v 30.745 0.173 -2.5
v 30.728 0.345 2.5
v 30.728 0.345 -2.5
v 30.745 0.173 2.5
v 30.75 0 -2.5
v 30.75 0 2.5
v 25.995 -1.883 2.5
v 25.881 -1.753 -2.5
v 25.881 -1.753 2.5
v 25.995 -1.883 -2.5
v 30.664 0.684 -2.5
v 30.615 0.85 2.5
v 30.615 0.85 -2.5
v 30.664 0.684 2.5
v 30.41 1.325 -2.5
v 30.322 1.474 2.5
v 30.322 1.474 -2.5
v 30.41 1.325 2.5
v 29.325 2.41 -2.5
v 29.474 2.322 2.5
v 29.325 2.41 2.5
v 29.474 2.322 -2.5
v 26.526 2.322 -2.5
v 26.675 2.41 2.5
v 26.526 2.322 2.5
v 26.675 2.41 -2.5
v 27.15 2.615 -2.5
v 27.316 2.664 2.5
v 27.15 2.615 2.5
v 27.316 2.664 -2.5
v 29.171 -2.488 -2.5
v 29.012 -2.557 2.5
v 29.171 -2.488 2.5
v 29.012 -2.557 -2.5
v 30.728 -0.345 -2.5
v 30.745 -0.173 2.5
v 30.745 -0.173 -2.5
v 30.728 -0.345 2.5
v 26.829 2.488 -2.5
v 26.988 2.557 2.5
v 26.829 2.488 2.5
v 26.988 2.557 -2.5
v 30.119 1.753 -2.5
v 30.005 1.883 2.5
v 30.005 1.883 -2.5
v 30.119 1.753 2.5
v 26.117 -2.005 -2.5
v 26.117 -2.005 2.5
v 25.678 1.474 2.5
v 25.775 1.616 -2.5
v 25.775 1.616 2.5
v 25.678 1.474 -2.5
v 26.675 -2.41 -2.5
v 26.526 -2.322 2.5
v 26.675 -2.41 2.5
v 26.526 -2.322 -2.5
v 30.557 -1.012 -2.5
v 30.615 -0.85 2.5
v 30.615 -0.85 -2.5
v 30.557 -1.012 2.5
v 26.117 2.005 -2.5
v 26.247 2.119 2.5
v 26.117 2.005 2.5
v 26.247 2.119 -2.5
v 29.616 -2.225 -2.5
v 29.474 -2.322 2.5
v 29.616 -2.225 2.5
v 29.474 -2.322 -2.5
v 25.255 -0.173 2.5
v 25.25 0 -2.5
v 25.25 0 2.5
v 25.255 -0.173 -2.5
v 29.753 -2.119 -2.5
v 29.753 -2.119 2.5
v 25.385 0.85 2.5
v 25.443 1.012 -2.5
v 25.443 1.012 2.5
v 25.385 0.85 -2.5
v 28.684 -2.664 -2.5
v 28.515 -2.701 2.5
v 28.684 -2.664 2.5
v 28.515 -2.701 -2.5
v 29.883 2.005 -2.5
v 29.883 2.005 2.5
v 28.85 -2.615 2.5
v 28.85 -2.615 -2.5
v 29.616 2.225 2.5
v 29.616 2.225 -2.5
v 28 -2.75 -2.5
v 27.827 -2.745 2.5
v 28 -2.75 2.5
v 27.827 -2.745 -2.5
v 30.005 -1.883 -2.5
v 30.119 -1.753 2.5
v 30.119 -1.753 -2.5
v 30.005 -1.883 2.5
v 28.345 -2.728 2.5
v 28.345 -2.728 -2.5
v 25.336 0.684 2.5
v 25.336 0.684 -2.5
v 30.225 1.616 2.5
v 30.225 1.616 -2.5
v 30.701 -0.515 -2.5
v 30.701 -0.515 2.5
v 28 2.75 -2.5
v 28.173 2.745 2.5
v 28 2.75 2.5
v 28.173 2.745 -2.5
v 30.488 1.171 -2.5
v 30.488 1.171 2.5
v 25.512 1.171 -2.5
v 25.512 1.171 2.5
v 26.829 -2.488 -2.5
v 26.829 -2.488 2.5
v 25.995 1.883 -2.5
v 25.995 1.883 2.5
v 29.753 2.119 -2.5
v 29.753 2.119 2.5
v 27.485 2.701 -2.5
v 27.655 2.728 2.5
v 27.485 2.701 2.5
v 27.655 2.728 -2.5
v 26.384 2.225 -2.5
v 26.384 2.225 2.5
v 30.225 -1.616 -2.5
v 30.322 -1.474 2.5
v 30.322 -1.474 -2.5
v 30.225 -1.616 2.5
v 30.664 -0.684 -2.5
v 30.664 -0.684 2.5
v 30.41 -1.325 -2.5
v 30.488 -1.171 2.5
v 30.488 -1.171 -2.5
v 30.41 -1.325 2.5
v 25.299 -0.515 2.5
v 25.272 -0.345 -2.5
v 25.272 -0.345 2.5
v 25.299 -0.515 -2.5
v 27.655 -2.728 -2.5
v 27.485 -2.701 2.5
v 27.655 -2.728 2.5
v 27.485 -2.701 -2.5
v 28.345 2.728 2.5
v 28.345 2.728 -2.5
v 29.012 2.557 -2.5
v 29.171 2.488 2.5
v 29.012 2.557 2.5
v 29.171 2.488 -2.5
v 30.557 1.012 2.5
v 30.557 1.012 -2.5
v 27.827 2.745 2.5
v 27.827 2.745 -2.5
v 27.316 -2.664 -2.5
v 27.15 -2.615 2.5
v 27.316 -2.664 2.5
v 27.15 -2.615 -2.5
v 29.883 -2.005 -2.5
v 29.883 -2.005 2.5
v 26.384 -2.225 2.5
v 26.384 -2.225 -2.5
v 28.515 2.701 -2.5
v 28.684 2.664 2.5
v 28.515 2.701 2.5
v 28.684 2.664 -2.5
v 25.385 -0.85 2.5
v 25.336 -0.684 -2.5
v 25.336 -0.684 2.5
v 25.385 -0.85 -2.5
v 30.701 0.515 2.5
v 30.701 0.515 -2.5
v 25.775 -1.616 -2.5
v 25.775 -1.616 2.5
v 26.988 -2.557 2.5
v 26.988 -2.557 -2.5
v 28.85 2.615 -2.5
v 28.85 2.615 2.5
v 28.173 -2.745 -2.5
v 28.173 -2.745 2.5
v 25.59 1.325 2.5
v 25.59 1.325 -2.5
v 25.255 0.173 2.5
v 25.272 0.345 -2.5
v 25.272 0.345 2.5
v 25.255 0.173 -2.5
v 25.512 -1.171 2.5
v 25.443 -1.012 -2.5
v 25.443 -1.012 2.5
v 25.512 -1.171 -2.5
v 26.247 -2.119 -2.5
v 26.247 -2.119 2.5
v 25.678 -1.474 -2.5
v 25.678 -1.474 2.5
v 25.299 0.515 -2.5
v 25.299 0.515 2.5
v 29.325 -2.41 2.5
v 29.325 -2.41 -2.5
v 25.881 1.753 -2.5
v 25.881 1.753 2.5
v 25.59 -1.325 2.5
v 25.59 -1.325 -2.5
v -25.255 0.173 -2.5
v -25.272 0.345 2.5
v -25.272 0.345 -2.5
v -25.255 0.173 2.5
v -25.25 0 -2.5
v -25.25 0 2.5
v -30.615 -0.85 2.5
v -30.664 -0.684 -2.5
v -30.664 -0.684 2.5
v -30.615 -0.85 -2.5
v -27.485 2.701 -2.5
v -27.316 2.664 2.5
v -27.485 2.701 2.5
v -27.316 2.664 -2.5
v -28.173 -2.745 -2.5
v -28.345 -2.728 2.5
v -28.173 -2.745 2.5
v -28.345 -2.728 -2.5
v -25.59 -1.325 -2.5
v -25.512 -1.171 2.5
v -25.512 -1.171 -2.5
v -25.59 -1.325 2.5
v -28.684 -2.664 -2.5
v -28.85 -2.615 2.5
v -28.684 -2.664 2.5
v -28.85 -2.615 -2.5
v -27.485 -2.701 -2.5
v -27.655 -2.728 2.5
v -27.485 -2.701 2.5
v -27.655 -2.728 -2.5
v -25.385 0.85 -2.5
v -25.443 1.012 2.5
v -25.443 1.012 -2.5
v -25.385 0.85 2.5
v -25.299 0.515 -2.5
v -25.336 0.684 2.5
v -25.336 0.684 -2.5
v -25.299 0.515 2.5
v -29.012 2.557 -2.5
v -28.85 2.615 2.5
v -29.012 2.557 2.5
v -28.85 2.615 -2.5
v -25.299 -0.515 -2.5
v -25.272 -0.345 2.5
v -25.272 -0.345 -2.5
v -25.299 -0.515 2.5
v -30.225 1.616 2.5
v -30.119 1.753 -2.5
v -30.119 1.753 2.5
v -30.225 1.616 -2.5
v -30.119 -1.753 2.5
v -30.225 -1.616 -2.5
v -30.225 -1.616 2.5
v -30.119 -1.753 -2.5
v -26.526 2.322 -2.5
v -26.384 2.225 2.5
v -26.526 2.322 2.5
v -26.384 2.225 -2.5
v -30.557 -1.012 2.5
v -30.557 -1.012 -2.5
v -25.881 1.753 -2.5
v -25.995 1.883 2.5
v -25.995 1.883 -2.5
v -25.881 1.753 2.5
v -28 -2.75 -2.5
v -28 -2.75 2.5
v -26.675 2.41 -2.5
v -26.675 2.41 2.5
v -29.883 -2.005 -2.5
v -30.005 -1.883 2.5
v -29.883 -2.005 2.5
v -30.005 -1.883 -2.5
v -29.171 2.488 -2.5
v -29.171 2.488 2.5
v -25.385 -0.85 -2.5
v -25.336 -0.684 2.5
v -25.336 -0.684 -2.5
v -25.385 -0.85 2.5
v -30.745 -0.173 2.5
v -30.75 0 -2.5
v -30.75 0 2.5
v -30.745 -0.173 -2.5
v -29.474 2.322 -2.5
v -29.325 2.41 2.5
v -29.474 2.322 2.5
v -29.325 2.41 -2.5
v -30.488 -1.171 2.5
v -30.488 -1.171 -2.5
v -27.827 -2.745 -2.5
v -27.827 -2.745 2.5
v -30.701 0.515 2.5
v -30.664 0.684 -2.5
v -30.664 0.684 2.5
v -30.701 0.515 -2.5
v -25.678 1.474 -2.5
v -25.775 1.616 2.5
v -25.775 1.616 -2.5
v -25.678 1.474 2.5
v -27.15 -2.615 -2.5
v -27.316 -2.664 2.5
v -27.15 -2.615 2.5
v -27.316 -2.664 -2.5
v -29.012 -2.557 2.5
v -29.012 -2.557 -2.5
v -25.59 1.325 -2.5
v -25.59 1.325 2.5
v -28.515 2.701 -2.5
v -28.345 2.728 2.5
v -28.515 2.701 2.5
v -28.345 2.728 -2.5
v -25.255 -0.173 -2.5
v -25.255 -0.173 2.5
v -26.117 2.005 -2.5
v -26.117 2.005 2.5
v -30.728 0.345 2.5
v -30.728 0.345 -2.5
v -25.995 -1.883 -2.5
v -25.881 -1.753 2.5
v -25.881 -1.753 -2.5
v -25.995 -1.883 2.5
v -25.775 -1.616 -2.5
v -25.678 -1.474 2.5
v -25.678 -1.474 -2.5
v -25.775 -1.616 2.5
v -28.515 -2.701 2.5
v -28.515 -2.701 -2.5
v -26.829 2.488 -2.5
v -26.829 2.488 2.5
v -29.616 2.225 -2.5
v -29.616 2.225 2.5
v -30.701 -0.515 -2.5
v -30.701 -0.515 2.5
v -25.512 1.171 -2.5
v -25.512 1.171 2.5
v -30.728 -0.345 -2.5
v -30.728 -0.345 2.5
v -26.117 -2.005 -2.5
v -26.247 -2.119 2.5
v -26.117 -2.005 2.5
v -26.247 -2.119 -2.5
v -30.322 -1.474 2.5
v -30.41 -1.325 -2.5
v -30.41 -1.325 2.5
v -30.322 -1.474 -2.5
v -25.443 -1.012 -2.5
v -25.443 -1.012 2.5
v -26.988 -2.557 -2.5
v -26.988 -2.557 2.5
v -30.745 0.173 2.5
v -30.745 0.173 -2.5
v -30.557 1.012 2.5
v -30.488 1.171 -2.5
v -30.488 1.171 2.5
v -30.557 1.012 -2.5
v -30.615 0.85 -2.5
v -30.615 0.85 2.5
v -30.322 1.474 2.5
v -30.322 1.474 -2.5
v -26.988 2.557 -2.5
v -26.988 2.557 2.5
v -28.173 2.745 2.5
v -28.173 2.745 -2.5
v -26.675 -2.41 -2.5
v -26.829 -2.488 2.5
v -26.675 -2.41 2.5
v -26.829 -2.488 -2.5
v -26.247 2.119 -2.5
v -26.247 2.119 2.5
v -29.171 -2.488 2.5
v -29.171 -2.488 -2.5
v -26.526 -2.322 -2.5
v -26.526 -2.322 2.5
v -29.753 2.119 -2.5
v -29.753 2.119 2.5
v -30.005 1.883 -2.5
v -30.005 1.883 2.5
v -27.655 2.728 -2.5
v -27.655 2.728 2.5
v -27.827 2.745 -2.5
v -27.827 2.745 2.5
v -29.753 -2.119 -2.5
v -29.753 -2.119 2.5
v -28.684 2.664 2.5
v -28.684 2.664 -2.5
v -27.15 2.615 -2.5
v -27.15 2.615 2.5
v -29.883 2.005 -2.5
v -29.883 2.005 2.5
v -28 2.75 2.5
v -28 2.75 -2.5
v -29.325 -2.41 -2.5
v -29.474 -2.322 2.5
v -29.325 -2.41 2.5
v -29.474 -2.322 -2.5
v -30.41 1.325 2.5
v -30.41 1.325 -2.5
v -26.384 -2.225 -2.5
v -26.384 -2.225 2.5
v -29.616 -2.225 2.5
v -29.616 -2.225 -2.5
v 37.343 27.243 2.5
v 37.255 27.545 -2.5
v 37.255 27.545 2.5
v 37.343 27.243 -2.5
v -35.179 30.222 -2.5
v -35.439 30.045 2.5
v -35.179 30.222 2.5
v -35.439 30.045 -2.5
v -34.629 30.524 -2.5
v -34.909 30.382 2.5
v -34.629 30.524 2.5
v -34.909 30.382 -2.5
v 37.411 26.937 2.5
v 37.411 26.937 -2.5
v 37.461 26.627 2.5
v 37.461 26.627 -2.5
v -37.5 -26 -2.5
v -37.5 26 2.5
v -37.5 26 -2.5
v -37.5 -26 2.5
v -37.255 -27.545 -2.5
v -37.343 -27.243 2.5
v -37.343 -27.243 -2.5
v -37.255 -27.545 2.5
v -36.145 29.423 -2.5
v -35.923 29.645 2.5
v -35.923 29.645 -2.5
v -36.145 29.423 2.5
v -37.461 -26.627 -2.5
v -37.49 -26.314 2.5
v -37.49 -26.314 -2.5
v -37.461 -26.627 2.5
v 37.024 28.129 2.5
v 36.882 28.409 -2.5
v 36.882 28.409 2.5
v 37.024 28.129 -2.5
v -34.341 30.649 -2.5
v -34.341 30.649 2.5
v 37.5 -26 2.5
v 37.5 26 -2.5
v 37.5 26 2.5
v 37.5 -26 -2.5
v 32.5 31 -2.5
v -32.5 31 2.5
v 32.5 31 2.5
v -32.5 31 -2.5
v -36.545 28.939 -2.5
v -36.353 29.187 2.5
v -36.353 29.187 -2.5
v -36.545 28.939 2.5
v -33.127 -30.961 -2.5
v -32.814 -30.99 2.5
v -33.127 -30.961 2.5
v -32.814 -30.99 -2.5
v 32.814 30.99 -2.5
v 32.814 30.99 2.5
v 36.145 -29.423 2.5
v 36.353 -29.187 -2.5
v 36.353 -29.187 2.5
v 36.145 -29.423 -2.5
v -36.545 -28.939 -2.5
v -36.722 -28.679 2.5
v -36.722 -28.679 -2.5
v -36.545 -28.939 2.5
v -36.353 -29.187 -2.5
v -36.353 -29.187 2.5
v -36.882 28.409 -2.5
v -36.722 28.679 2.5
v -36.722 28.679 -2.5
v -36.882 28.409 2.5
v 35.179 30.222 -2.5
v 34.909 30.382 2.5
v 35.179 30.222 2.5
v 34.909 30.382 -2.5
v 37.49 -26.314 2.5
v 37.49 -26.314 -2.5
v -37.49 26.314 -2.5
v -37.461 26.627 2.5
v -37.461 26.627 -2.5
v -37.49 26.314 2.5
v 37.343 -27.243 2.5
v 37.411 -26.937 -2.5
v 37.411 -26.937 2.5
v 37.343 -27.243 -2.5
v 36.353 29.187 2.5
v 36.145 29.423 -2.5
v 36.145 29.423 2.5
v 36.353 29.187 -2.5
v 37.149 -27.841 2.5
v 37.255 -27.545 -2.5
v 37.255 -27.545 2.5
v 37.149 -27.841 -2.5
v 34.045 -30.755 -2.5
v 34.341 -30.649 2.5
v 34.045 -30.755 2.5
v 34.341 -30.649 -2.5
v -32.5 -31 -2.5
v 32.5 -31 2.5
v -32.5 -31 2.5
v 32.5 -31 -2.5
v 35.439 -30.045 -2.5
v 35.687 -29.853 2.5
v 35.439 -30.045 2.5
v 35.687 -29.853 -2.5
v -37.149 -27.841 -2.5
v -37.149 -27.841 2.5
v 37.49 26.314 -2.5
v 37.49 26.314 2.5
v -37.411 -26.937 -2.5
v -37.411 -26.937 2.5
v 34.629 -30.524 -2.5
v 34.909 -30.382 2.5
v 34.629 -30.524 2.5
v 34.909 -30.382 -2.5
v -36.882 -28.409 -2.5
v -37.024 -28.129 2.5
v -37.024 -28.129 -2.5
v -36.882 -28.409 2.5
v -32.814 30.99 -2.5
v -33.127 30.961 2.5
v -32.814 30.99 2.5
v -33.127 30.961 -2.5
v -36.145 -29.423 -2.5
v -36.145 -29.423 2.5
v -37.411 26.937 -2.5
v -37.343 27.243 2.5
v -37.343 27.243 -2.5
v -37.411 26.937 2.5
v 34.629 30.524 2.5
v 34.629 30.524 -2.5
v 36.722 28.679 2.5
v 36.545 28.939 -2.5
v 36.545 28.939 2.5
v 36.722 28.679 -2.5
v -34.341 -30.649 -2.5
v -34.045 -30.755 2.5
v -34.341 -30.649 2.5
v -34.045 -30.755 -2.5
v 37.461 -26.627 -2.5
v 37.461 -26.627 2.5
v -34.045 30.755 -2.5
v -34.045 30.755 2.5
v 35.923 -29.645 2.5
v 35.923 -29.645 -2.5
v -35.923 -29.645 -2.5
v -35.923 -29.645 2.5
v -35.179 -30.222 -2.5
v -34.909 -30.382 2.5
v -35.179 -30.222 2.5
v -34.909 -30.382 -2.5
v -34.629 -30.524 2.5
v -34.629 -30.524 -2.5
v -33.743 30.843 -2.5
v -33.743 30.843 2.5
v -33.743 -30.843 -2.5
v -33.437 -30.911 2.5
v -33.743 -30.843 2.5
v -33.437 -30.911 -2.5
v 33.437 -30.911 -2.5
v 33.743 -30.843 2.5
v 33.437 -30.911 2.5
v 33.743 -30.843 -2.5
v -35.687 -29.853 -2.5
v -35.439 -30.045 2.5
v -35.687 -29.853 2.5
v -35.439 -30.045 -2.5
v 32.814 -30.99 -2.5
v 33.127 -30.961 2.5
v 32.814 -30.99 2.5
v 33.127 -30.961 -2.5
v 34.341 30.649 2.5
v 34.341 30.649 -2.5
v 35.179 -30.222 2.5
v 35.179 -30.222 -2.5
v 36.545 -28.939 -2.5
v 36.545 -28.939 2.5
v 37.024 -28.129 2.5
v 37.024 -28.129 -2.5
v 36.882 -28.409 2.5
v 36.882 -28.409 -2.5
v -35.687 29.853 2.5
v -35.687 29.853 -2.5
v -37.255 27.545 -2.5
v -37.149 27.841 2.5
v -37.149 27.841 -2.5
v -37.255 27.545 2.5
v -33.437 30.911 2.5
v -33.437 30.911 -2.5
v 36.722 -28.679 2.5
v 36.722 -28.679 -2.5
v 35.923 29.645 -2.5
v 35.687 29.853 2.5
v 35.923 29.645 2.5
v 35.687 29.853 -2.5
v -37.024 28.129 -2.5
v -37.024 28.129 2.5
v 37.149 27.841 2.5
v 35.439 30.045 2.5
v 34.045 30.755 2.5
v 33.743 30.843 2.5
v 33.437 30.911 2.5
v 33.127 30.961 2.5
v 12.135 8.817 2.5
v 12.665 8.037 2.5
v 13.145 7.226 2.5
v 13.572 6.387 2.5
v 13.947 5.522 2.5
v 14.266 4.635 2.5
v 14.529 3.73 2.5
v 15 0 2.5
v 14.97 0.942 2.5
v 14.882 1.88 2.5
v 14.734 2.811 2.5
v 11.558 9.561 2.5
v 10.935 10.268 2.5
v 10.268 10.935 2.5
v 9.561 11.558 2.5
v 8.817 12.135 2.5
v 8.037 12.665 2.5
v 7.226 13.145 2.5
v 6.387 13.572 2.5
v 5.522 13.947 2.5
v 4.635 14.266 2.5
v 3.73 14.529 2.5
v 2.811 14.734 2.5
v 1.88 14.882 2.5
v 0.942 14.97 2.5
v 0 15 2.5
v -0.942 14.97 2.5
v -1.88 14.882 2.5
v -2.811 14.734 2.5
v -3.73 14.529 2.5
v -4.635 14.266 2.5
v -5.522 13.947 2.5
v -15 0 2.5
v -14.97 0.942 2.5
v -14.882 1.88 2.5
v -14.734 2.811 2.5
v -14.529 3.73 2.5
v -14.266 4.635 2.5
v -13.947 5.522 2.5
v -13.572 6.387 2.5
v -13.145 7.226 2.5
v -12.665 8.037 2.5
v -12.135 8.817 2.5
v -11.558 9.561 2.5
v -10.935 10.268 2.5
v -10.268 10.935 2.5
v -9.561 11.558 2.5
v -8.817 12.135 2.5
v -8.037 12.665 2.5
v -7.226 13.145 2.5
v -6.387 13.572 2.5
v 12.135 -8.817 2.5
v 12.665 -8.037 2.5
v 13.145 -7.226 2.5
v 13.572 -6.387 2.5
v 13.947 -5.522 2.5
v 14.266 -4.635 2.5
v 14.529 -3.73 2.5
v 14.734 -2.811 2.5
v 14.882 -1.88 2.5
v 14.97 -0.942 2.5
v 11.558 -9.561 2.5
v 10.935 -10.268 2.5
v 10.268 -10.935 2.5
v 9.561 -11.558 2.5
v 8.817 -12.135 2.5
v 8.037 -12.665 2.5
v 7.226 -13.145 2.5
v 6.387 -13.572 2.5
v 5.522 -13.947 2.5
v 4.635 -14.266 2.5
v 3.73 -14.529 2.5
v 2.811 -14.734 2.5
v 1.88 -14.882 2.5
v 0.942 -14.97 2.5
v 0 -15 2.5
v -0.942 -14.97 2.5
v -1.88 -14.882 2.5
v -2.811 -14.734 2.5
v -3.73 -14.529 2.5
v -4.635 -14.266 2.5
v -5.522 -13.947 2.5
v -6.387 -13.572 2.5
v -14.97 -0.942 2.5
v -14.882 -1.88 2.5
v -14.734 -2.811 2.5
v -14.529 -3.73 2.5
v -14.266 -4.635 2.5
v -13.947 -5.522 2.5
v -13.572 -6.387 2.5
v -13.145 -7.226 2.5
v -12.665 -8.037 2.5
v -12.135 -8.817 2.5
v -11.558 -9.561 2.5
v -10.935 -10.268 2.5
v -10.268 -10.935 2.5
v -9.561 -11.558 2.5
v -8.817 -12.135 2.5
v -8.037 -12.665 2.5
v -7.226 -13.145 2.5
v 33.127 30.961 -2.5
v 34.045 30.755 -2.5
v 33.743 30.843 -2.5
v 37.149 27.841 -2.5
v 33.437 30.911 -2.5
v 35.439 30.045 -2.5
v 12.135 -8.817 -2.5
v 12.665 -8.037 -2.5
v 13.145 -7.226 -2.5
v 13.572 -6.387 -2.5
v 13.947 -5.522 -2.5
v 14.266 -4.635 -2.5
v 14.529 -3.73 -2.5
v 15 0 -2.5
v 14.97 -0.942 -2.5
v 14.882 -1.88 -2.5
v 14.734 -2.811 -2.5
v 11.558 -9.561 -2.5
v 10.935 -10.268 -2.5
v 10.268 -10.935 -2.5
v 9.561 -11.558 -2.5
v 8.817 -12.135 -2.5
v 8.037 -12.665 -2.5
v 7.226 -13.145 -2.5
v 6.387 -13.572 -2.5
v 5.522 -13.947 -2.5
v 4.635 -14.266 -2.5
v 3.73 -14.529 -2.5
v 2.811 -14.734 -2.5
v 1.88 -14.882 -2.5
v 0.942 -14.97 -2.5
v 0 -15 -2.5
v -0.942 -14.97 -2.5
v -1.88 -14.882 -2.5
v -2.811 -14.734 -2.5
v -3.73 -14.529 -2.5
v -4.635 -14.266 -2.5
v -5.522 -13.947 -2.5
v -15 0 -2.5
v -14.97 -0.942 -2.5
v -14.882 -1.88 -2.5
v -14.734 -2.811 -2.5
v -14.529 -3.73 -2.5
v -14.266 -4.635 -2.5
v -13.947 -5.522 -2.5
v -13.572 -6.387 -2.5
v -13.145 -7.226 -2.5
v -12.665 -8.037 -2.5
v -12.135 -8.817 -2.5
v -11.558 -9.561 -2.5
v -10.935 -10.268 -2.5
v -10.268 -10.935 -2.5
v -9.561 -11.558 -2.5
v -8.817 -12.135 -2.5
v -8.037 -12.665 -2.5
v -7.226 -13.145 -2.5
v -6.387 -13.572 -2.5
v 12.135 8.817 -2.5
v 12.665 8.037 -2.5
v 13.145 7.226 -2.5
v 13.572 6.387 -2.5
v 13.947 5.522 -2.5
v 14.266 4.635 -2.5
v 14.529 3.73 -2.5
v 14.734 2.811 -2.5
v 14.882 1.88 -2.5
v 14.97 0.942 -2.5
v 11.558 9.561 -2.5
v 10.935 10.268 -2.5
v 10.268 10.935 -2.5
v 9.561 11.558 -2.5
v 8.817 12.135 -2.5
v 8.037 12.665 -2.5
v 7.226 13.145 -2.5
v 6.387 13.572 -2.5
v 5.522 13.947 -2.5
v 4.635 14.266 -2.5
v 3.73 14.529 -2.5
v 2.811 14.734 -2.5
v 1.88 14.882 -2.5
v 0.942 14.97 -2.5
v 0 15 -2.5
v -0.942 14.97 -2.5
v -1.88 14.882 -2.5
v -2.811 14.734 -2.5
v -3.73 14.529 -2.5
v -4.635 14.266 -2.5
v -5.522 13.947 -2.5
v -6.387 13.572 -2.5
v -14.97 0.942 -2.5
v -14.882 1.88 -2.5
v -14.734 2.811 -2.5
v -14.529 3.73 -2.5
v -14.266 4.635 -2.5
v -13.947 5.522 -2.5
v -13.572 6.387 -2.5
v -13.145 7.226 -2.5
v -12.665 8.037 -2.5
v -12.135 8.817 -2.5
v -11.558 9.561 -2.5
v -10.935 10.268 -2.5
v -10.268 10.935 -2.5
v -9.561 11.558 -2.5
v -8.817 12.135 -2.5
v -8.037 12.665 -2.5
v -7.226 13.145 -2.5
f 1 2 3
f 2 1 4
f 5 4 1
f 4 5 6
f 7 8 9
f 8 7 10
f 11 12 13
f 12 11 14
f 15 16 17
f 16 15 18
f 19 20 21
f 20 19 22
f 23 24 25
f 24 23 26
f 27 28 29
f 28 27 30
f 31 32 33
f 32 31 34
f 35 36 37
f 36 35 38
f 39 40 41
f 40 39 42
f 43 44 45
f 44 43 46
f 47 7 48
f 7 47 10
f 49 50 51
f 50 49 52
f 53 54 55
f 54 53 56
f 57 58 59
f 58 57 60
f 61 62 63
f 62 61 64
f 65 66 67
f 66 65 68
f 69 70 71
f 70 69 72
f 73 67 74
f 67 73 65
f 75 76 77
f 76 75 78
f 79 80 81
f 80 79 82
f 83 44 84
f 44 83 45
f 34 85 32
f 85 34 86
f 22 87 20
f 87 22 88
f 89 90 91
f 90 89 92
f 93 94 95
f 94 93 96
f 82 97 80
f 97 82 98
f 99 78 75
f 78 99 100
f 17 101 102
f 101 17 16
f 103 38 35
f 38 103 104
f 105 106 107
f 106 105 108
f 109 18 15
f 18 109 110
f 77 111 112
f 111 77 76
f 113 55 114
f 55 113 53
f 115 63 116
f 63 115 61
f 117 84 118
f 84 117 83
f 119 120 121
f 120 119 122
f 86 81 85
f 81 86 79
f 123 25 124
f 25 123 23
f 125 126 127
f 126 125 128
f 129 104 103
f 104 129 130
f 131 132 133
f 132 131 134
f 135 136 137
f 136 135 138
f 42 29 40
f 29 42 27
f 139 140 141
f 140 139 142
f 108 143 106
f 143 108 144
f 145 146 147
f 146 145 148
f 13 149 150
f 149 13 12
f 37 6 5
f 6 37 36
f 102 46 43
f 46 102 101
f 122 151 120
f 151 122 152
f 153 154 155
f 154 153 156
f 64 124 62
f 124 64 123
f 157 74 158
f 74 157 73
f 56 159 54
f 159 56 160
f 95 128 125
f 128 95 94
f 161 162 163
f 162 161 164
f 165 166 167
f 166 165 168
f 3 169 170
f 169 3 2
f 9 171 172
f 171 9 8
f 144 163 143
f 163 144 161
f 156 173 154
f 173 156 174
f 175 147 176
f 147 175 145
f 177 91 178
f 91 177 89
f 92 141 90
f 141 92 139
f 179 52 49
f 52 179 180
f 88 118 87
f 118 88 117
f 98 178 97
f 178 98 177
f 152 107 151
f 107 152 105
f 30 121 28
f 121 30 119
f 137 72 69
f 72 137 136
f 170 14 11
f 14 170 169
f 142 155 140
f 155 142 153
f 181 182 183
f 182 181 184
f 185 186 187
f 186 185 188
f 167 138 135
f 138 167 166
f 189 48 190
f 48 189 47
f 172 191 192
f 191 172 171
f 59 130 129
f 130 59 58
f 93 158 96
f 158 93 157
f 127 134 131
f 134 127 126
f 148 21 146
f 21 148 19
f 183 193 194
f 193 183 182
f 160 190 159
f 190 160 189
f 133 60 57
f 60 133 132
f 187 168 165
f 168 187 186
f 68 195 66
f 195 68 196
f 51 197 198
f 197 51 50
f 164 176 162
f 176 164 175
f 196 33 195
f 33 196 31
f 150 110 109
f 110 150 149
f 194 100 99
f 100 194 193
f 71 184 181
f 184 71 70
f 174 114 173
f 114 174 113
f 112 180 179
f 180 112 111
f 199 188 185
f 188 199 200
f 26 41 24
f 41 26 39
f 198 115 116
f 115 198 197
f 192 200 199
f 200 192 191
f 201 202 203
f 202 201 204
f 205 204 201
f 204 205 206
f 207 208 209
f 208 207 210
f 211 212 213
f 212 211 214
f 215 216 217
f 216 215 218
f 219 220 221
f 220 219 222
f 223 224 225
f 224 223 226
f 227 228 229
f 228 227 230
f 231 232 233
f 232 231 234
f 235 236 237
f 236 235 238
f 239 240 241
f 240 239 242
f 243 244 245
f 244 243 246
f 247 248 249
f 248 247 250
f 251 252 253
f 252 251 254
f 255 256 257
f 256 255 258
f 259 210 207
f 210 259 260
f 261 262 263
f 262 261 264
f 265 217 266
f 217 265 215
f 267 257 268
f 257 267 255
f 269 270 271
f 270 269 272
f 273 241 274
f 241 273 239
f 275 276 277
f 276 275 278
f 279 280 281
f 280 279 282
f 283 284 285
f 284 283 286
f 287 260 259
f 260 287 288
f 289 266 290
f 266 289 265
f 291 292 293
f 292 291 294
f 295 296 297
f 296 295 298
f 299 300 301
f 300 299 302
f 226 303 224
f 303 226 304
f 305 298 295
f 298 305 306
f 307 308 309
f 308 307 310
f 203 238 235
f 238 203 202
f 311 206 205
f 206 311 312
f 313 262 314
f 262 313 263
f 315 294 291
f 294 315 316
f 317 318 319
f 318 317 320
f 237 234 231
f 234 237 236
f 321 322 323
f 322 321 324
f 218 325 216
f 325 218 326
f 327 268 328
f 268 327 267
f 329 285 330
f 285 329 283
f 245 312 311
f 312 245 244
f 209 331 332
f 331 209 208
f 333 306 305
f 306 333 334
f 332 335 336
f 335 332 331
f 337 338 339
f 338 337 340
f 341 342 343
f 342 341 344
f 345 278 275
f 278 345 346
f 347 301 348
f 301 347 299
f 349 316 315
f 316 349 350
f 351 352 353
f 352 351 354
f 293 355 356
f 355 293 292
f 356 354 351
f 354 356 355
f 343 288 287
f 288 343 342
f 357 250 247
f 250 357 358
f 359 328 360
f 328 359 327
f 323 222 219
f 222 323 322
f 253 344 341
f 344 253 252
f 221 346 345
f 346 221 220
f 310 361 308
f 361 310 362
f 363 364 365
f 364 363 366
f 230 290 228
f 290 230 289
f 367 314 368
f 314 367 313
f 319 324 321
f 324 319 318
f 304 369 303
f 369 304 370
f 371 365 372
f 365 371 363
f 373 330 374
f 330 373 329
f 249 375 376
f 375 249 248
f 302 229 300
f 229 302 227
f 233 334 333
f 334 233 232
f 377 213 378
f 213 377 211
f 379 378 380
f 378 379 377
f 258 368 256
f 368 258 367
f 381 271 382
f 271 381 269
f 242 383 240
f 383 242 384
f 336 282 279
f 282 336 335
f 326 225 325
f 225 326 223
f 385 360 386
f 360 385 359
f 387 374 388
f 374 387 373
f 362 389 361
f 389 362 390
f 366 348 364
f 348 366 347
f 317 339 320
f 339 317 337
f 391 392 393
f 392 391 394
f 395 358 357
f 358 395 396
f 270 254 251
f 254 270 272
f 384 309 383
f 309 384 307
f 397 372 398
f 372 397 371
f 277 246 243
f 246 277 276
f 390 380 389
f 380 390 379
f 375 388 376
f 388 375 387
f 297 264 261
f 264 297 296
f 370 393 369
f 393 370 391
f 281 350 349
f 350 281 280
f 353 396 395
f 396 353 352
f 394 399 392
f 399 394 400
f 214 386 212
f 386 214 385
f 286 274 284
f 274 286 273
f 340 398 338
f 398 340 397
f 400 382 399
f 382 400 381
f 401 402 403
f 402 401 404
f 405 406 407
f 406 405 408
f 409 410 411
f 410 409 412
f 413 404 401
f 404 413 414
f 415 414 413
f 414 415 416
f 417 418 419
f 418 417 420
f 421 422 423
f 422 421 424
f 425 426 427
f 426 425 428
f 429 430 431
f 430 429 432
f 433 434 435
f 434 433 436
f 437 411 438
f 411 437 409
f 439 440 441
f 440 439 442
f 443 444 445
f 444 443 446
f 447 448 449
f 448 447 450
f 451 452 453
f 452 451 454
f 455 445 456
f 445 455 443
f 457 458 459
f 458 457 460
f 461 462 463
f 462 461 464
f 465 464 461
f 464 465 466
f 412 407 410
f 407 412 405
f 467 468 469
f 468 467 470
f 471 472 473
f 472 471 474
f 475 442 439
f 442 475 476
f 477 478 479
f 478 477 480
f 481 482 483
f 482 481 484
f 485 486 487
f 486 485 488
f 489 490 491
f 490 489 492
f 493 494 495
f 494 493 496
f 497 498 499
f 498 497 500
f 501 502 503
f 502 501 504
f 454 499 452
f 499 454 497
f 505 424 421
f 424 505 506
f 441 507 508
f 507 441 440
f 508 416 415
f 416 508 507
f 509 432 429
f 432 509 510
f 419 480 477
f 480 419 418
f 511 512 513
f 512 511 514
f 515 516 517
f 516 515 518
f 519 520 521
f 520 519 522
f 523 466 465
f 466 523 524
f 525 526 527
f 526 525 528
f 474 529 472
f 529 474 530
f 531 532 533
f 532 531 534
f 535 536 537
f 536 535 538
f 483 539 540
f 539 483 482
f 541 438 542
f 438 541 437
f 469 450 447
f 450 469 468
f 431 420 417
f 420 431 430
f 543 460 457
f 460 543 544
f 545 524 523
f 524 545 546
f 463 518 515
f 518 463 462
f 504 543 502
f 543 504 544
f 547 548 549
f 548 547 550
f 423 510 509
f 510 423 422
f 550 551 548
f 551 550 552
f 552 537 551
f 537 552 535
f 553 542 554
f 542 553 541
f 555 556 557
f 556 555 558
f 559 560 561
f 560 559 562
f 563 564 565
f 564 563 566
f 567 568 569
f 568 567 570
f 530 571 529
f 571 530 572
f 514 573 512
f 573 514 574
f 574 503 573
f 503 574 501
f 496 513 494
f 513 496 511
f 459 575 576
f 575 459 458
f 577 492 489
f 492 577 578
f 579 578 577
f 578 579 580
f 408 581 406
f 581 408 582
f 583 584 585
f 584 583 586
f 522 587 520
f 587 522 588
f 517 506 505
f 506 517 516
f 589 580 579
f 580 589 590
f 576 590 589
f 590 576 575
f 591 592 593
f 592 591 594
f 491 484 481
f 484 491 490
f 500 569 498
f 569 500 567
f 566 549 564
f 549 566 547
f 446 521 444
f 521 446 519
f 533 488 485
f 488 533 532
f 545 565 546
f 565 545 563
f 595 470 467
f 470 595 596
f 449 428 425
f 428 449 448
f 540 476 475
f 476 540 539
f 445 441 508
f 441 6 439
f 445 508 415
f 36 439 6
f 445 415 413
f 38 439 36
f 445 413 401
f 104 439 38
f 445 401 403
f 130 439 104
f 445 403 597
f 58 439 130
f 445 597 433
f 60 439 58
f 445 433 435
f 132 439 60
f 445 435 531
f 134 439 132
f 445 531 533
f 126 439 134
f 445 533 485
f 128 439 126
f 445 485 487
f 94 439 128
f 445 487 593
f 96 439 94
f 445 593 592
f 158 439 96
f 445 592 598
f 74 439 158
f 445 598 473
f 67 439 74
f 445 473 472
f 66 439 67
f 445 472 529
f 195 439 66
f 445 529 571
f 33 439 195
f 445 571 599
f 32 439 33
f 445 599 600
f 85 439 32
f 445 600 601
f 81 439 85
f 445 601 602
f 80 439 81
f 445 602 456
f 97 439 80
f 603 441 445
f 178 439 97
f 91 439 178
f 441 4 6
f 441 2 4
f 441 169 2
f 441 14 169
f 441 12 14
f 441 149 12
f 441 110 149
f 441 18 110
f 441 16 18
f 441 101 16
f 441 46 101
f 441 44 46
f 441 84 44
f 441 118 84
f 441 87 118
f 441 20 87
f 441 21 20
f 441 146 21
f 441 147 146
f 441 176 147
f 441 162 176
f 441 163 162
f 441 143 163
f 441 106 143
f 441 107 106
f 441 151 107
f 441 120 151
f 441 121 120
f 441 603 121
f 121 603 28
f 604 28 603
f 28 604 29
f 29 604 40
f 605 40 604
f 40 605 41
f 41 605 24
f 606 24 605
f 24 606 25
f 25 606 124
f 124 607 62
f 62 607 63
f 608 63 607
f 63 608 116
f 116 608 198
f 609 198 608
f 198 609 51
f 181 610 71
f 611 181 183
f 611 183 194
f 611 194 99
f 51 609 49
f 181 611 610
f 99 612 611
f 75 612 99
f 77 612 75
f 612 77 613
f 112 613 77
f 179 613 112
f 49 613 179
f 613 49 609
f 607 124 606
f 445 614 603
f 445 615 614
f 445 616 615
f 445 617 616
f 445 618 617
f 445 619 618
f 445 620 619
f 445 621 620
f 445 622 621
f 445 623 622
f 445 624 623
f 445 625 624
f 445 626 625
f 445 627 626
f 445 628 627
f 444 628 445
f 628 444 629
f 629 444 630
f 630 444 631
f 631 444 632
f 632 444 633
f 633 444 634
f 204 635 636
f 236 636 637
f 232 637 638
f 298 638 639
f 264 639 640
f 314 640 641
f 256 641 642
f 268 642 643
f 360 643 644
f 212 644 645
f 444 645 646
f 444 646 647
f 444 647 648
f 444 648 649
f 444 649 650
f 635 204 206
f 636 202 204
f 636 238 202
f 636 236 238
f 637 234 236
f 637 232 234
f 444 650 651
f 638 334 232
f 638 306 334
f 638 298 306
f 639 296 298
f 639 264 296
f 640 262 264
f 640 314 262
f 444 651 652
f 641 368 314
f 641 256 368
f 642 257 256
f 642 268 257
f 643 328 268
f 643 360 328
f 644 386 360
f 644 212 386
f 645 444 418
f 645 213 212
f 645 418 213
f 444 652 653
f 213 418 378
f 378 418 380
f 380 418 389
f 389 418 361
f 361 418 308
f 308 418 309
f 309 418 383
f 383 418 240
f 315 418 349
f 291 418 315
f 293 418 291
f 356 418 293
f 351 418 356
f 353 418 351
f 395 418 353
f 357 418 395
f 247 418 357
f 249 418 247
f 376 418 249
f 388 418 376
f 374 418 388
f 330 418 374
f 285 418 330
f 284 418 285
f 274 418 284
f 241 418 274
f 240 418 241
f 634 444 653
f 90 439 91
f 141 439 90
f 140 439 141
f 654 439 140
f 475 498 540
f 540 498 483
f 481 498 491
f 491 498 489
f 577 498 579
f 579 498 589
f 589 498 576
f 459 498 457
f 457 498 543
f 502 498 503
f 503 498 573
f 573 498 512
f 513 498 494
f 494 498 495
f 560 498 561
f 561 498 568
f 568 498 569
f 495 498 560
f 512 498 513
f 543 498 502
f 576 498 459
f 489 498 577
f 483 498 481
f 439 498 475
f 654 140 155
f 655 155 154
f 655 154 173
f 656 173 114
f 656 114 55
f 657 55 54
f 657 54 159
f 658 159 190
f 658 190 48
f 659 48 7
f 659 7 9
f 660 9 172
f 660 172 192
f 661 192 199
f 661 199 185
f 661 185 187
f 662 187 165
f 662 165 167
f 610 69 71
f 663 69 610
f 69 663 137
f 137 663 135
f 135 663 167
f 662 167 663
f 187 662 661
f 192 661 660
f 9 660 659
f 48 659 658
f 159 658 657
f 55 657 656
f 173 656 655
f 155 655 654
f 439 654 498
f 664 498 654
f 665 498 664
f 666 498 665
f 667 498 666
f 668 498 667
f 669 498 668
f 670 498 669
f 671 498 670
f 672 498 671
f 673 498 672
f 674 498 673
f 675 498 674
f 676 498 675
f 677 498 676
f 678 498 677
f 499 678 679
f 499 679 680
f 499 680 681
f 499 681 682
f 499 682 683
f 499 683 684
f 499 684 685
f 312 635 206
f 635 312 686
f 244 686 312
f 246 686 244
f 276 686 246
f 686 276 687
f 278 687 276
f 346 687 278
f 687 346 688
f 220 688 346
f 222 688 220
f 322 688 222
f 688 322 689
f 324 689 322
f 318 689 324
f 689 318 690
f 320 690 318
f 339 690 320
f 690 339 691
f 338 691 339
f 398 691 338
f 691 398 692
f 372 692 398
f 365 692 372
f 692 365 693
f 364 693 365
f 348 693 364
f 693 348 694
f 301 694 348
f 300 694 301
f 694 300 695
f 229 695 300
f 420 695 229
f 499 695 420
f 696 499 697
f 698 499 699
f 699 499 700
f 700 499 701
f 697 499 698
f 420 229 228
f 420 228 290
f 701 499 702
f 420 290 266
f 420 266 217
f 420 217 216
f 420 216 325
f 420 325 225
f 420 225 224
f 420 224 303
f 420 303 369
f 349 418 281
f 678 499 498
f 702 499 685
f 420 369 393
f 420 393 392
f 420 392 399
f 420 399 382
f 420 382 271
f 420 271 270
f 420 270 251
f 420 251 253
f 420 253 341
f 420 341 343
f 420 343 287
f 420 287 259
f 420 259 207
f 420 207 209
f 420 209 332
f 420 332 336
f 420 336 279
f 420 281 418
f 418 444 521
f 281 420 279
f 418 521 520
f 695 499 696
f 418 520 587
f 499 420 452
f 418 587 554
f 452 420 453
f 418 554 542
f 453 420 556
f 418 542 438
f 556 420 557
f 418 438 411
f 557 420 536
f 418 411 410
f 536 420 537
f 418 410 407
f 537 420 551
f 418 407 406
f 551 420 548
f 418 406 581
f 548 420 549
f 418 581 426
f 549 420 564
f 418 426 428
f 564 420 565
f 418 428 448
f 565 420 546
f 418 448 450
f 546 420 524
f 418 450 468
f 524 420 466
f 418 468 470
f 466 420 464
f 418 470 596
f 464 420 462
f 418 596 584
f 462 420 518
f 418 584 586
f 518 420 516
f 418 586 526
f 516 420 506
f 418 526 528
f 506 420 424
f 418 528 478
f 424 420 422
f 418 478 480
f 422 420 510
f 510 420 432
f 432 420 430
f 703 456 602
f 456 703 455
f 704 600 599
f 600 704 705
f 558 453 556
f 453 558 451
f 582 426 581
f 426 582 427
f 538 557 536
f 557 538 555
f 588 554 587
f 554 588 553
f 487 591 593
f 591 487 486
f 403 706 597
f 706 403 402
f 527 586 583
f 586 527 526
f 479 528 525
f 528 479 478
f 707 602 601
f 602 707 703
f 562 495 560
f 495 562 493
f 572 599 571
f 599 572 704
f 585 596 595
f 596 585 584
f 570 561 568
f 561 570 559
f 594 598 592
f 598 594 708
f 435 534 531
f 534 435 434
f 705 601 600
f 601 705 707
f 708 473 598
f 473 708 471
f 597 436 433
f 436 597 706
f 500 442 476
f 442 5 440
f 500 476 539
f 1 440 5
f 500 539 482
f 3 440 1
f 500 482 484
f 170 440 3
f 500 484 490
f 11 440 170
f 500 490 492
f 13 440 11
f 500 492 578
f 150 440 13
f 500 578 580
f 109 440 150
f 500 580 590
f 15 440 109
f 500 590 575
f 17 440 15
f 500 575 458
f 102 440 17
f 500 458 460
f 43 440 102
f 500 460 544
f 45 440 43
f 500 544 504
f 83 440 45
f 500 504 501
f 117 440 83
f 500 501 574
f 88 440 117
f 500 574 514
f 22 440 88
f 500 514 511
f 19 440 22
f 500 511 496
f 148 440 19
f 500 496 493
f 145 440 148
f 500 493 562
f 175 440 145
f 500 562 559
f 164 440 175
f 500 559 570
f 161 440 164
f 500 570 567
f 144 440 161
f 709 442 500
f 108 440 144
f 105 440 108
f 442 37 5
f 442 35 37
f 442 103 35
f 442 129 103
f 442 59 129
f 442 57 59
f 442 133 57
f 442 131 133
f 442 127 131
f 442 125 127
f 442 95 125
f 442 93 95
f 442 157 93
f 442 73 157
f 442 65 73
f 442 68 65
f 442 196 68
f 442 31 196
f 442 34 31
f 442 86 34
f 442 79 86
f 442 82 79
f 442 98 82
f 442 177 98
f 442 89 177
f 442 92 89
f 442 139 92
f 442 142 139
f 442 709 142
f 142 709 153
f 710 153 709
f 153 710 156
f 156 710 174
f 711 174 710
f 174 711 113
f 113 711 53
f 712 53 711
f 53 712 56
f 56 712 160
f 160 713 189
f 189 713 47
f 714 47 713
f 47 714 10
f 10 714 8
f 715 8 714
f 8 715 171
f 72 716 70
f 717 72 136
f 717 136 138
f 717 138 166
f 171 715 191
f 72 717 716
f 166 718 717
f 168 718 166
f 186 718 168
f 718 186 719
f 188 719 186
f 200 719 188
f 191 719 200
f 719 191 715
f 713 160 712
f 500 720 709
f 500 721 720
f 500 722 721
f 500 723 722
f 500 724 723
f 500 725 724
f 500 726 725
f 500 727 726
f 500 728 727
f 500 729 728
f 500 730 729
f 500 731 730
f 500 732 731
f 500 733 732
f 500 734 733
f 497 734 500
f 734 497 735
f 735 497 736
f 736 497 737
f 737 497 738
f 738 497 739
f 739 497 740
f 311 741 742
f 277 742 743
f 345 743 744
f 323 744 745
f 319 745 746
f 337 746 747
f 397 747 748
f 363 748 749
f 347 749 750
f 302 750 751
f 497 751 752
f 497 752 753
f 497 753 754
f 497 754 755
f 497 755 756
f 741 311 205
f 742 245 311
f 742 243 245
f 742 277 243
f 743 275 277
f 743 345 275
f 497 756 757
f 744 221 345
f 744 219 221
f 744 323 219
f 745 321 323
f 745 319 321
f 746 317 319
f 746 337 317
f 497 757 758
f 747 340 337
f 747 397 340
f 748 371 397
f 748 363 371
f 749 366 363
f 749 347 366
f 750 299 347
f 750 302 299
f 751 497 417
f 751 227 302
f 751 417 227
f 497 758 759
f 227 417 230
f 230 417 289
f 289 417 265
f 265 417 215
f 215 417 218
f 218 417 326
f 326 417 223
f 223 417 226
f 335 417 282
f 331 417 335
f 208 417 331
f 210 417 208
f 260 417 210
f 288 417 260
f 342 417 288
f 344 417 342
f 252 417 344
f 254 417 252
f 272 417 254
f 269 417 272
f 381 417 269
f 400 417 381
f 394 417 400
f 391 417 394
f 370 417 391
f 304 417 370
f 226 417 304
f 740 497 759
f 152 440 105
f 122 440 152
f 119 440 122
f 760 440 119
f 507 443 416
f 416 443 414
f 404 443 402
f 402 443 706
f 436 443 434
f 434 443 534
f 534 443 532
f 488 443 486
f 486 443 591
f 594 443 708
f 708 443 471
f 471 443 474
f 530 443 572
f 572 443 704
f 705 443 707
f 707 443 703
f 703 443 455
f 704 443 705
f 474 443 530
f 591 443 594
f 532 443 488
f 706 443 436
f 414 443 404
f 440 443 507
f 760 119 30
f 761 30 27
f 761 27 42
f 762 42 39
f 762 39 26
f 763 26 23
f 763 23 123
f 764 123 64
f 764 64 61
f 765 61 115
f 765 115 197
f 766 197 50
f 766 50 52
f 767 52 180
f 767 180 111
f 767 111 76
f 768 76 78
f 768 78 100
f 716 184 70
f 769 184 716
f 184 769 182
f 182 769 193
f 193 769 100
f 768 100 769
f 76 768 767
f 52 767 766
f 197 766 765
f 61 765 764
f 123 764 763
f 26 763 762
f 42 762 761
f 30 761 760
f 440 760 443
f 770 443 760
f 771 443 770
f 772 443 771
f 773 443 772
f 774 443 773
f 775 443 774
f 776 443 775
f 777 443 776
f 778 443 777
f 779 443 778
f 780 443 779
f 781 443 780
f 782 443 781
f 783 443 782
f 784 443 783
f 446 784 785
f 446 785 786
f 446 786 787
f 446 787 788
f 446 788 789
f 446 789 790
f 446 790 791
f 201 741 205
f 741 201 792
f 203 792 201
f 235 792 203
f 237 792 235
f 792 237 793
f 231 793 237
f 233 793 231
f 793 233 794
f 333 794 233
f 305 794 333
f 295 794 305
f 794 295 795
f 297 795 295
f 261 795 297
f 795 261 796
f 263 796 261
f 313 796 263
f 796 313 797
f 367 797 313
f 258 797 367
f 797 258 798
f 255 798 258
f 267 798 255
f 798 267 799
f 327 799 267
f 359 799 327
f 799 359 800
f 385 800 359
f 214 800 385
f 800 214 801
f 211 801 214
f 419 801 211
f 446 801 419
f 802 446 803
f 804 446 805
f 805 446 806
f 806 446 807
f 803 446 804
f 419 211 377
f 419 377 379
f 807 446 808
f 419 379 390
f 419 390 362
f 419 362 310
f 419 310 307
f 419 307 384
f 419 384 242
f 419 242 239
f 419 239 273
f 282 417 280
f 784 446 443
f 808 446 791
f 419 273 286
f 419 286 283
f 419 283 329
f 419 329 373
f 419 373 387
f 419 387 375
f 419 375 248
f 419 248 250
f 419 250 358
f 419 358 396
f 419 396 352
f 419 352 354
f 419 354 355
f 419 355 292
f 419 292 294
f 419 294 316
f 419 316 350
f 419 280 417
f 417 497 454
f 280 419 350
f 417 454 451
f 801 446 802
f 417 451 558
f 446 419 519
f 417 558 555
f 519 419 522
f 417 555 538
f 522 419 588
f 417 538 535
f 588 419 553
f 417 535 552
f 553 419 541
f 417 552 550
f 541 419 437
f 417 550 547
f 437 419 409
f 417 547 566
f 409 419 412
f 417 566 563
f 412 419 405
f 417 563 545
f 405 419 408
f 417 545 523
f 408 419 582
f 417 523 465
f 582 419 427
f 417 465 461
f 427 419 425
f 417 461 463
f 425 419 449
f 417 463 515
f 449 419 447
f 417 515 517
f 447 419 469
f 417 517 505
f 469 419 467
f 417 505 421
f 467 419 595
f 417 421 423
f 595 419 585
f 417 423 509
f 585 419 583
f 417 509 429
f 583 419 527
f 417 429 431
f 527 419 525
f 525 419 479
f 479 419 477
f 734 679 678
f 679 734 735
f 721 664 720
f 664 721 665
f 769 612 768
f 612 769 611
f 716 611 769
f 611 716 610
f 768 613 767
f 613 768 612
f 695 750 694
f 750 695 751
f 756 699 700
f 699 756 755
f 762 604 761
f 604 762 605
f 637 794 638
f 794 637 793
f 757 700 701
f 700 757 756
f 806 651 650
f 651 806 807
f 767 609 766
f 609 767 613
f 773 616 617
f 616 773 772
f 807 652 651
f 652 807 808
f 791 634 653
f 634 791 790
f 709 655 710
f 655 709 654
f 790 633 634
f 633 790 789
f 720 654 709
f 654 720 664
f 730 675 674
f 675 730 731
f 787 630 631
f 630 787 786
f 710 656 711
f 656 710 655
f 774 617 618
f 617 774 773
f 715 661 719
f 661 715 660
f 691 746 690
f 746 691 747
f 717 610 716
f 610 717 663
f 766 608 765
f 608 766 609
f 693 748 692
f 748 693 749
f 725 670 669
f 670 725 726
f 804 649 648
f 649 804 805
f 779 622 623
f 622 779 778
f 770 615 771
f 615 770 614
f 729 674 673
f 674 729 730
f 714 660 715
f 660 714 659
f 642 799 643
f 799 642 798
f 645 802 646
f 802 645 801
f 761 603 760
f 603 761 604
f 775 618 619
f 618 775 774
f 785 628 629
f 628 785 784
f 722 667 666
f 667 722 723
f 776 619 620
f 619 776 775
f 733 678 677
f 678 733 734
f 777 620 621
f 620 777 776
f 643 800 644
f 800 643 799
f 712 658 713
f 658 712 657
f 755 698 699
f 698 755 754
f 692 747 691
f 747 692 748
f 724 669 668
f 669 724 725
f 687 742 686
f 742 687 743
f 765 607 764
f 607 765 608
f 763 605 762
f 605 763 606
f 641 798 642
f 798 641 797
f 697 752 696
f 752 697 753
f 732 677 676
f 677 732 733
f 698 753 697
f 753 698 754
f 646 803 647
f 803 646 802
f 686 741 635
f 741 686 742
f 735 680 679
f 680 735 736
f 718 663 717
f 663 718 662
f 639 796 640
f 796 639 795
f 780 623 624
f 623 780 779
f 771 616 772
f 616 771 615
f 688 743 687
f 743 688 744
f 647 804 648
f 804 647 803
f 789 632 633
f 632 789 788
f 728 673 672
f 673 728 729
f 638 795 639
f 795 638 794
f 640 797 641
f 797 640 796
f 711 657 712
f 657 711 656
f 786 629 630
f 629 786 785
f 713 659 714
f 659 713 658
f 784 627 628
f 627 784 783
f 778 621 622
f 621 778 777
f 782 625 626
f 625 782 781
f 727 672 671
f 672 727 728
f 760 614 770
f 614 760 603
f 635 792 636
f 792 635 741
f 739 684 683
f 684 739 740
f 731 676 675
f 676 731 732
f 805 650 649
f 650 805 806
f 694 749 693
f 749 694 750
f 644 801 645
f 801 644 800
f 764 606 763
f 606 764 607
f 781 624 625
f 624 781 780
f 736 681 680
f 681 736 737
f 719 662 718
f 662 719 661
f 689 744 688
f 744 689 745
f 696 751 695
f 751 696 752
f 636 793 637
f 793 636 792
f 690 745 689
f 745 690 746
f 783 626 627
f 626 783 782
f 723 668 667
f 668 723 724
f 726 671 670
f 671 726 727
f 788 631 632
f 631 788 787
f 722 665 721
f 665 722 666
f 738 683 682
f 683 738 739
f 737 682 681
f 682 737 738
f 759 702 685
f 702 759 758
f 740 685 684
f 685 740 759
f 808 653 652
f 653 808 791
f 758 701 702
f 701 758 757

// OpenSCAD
$fn=100;

plate_length=70;
plate_width=57;
rounding_radius=5;
plate_thickness = 5;
fiddle=1;


module plate_holes() {
    mid_hole_from_edge = 7;
    mid_hole_from_center = plate_length/2 - mid_hole_from_edge;
    
    translate([mid_hole_from_center, 0, 0]) {
        plate_hole();
    }
    
    translate([-mid_hole_from_center, 0, 0]) {
        plate_hole();
    }
}

module charger_hole() {
    cylinder(h=plate_thickness+2*fiddle, d=30, center = true);
}

module plate_hole() {
    cylinder(h=plate_thickness+2*fiddle, d=5.5, center=true);
}

module base_plate() {  
    linear_extrude(height=plate_thickness, center=true) {
        minkowski() {
           square([plate_length-rounding_radius, 
            plate_width-rounding_radius],
            center=true);
           circle(r=rounding_radius, center=true);
        }
    }
}

module plate() {
    difference() {
        base_plate();
        plate_holes();
        charger_hole();
    }
}

module mount() {
    plate();
}

mount();
